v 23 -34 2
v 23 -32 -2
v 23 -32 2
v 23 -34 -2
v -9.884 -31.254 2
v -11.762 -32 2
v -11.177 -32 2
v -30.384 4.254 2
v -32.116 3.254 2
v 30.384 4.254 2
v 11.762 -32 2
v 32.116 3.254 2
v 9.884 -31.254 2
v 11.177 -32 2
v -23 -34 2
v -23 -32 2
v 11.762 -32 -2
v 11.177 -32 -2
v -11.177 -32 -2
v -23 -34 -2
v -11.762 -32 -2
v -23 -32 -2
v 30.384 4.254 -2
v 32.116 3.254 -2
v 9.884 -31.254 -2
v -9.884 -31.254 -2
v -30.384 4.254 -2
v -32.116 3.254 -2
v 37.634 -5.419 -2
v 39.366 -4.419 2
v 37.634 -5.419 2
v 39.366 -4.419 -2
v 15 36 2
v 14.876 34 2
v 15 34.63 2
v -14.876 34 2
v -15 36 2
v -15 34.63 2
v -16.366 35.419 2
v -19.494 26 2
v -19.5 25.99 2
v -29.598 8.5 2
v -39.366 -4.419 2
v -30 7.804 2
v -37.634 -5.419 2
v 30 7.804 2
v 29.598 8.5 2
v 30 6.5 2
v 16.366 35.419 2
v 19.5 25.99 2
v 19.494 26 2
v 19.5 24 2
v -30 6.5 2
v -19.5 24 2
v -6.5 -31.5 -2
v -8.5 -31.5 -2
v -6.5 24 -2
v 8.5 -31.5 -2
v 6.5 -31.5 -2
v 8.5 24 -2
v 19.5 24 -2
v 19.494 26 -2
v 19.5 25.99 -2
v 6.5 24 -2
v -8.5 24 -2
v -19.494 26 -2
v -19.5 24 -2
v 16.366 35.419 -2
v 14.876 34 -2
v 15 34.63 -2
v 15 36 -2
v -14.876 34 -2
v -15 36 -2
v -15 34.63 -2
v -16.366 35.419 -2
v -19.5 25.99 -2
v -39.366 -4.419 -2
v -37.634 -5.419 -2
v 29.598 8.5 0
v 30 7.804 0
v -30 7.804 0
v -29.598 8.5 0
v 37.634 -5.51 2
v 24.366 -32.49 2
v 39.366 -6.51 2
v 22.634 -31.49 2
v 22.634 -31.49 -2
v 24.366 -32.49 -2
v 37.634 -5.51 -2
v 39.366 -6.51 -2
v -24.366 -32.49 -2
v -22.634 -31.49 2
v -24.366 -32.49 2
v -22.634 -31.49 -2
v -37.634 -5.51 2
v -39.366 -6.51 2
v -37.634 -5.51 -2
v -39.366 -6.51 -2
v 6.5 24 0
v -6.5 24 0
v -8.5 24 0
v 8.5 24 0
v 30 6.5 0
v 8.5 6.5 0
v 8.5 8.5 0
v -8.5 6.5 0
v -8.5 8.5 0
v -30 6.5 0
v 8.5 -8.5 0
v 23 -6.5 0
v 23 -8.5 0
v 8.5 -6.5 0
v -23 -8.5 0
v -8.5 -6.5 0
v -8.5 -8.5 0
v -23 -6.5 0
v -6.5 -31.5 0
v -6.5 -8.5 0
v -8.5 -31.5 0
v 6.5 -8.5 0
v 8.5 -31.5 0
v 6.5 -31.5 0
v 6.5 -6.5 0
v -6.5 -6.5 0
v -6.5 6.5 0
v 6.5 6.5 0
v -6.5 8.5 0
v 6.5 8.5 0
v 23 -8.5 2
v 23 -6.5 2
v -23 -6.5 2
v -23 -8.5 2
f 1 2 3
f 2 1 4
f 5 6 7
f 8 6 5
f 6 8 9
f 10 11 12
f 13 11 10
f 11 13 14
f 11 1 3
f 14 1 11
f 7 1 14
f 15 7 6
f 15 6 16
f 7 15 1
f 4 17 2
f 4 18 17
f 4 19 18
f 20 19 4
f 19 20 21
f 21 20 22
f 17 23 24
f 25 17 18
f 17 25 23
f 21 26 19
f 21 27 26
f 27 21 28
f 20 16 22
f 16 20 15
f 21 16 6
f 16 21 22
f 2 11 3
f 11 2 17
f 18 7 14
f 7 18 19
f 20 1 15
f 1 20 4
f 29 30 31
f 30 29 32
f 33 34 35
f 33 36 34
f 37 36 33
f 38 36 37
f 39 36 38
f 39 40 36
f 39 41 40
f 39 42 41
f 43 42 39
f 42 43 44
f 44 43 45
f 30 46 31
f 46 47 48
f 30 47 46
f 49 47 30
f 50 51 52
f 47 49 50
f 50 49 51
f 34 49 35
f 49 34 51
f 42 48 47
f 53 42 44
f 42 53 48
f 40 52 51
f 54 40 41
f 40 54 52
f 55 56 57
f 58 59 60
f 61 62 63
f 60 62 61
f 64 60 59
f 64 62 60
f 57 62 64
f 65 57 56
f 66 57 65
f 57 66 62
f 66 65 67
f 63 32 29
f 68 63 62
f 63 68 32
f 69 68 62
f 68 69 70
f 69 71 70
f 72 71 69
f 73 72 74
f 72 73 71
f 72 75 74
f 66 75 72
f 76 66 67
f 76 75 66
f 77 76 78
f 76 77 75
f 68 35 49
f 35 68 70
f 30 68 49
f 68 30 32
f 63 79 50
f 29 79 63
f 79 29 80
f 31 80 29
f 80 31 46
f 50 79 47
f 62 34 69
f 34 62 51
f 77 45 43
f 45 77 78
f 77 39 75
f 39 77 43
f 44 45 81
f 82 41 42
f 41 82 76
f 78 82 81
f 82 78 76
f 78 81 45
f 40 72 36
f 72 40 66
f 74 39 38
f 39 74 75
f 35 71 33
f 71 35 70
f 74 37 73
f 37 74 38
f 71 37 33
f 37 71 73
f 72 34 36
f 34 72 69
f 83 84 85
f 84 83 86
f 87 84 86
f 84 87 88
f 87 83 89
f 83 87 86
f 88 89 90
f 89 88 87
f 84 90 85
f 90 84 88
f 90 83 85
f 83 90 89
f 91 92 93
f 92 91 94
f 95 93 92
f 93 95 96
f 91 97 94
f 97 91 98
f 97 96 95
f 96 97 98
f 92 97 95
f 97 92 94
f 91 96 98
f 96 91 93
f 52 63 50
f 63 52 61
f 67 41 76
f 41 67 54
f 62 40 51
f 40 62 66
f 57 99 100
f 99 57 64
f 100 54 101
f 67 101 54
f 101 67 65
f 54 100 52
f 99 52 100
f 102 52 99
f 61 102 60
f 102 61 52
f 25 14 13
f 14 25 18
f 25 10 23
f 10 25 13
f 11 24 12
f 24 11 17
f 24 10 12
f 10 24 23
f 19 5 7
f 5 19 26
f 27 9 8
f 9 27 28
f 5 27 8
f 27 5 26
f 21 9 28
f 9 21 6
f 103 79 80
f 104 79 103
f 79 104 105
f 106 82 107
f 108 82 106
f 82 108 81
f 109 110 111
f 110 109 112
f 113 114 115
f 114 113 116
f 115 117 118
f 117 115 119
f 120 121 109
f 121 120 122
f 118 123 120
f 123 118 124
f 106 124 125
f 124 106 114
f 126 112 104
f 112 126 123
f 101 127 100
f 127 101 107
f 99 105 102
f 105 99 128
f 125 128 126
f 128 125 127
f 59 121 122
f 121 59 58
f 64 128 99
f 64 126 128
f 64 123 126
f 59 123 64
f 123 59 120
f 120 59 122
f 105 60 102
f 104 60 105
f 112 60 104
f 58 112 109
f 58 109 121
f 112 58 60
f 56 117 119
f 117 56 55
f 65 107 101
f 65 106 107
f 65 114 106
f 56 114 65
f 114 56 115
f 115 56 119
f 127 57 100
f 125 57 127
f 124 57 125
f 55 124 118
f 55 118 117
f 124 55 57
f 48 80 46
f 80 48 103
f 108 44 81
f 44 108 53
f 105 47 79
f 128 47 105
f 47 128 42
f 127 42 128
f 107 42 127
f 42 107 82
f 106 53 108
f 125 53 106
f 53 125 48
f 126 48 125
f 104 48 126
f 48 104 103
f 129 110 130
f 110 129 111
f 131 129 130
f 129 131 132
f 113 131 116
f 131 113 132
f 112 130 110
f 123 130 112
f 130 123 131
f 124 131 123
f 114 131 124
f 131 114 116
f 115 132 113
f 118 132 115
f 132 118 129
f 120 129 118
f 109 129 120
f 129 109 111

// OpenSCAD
// Generated by SolidPython 1.1.3 on 2023-10-14 10:21:24
$fn = 48;


union() {
	union() {
		translate(v = [0, -33, 0]) {
			rotate(a = [0, 0, 0]) {
				cube(center = true, size = [46, 2, 4]);
			}
		}
	}
	union() {
		translate(v = [27, 15, 0]) {
			rotate(a = [0, 0, -60]) {
				cube(center = true, size = [46, 2, 4]);
			}
		}
	}
	union() {
		translate(v = [-27, 15, 0]) {
			rotate(a = [0, 0, 60]) {
				cube(center = true, size = [46, 2, 4]);
			}
		}
	}
	union() {
		translate(v = [0, 35, 0]) {
			rotate(a = [0, 0, 0]) {
				cube(center = true, size = [30, 2, 4]);
			}
		}
	}
	union() {
		translate(v = [31, -19, 0]) {
			rotate(a = [0, 0, 60]) {
				cube(center = true, size = [30, 2, 4]);
			}
		}
	}
	union() {
		translate(v = [-31, -19, 0]) {
			rotate(a = [0, 0, -60]) {
				cube(center = true, size = [30, 2, 4]);
			}
		}
	}
	union() {
		translate(v = [0, 25, 0]) {
			rotate(a = [0, 0, 0]) {
				cube(center = true, size = [39, 2, 4]);
			}
		}
	}
	union() {
		translate(v = [21, -14, 0]) {
			rotate(a = [0, 0, 60]) {
				cube(center = true, size = [41, 2, 4]);
			}
		}
	}
	union() {
		translate(v = [-21, -14, 0]) {
			rotate(a = [0, 0, -60]) {
				cube(center = true, size = [41, 2, 4]);
			}
		}
	}
	union() {
		translate(v = [7.5000000000, -3, -1]) {
			rotate(a = [0, 0, 90]) {
				cube(center = true, size = [57, 2, 2]);
			}
		}
	}
	union() {
		translate(v = [-7.5000000000, -3, -1]) {
			rotate(a = [0, 0, 90]) {
				cube(center = true, size = [57, 2, 2]);
			}
		}
	}
	union() {
		translate(v = [0, 7.5000000000, 1]) {
			rotate(a = [0, 0, 0]) {
				cube(center = true, size = [60, 2, 2]);
			}
		}
	}
	union() {
		translate(v = [0, -7.5000000000, 1]) {
			rotate(a = [0, 0, 0]) {
				cube(center = true, size = [46, 2, 2]);
			}
		}
	}
}
/***********************************************
*********      SolidPython code:      **********
************************************************
 
#! /usr/bin/env python3
import sys

from solid import scad_render_to_file
from solid.objects import cube, cylinder, difference, translate, union, rotate
from solid.utils import right
import numpy as np
SEGMENTS = 48


small1_transy = 35
wheel_dist = 10

def basic_geometry():
    # SolidPython code can look a lot like OpenSCAD code.  It also has
    # some syntactic sugar built in that can make it look more pythonic.
    # Here are two identical pieces of geometry, one left and one right.

    # left_piece uses standard OpenSCAD grammar (note the commas between
    # block elements; OpenSCAD doesn't require this)
    big_piece1 = union()(
            translate((0, -33, 0))(
            rotate((0, 0 ,0))(
                    cube([46, 2, 4], center=True)
                    )
            ),
            
            
    )
    big_piece2 = union()(
            translate((27, 15, 0))(
            rotate((0, 0 ,-60))(
                    cube([46, 2, 4], center=True)
                    )
            ),
            
            
    )
    big_piece3 = union()(
            translate((-27, 15, 0))(
            rotate((0, 0 ,60))(
                    cube([46, 2, 4], center=True)
                    )
            ),
            
            
    )

    # Right piece uses a more Pythonic grammar.  + (plus) is equivalent to union(), 
    # - (minus) is equivalent to difference() and * (star) is equivalent to intersection
    # solid.utils also defines up(), down(), left(), right(), forward(), and back()
    # for common transforms.

    small_piece1 = union()(
            translate((0, 35, 0))(
            rotate((0, 0 ,0))(
                    cube([30, 2, 4], center=True)
                    )
            ),
            
            
    )
    small_piece2 = union()(
            translate((31,-19, 0))(
            rotate((0, 0 ,60))(
                    cube([30, 2, 4], center=True)
                    )
            ),
            
    )
    small_piece3 = union()(
            translate((-31,-19, 0))(
            rotate((0, 0 ,-60))(
                    cube([30, 2, 4], center=True)
                    )
            ),
            
    )
    small_middlepiece1 = union()(
            translate((0, small1_transy-wheel_dist, 0))(
            rotate((0, 0 ,0))(
                    cube([39, 2, 4], center=True)
                    )
            ),
            
            
    )
    small_middlepiece2 = union()(
            translate((31-wheel_dist,-14, 0))(
            rotate((0, 0 ,60))(
                    cube([41, 2, 4], center=True)
                    )
            ),
            
    )
    small_middlepiece3 = union()(
            translate((-31+wheel_dist,-14, 0))(
            rotate((0, 0 ,-60))(
                    cube([41, 2, 4], center=True)
                    )
            ),
            
    )
    middlepiecevert1 = union()(
            translate((7.5,-3, -1))(
            rotate((0, 0 ,90))(
                    cube([57, 2, 2], center=True)
                    )
            ),
            
    )
    middlepiecevert2 = union()(
            translate((-7.5,-3, -1))(
            rotate((0, 0 ,90))(
                    cube([57, 2, 2], center=True)
                    )
            ),
            
    )
    middlepiecehor1 = union()(
            translate((0,7.5, 1))(
            rotate((0, 0 ,0))(
                    cube([60, 2, 2], center=True)
                    )
            ),
            
    )
    middlepiecehor2 = union()(
            translate((0,-7.5, 1))(
            rotate((0, 0 ,0))(
                    cube([46, 2, 2], center=True)
                    )
            ),
            
    )


   
    return union()(big_piece1, big_piece2, big_piece3, small_piece1, small_piece2, small_piece3,small_middlepiece1, small_middlepiece2, small_middlepiece3, middlepiecevert1, middlepiecevert2, middlepiecehor1, middlepiecehor2)


if __name__ == '__main__':
    out_dir = sys.argv[1] if len(sys.argv) > 1 else None

    a = basic_geometry()

    # Adding the file_header argument as shown allows you to change
    # the detail of arcs by changing the SEGMENTS variable.  This can
    # be expensive when making lots of small curves, but is otherwise
    # useful.
    file_out = scad_render_to_file(a, out_dir=out_dir, file_header=f'$fn = {SEGMENTS};')
    print(f"{__file__}: SCAD file written to: \n{file_out}")
 
 
************************************************/
